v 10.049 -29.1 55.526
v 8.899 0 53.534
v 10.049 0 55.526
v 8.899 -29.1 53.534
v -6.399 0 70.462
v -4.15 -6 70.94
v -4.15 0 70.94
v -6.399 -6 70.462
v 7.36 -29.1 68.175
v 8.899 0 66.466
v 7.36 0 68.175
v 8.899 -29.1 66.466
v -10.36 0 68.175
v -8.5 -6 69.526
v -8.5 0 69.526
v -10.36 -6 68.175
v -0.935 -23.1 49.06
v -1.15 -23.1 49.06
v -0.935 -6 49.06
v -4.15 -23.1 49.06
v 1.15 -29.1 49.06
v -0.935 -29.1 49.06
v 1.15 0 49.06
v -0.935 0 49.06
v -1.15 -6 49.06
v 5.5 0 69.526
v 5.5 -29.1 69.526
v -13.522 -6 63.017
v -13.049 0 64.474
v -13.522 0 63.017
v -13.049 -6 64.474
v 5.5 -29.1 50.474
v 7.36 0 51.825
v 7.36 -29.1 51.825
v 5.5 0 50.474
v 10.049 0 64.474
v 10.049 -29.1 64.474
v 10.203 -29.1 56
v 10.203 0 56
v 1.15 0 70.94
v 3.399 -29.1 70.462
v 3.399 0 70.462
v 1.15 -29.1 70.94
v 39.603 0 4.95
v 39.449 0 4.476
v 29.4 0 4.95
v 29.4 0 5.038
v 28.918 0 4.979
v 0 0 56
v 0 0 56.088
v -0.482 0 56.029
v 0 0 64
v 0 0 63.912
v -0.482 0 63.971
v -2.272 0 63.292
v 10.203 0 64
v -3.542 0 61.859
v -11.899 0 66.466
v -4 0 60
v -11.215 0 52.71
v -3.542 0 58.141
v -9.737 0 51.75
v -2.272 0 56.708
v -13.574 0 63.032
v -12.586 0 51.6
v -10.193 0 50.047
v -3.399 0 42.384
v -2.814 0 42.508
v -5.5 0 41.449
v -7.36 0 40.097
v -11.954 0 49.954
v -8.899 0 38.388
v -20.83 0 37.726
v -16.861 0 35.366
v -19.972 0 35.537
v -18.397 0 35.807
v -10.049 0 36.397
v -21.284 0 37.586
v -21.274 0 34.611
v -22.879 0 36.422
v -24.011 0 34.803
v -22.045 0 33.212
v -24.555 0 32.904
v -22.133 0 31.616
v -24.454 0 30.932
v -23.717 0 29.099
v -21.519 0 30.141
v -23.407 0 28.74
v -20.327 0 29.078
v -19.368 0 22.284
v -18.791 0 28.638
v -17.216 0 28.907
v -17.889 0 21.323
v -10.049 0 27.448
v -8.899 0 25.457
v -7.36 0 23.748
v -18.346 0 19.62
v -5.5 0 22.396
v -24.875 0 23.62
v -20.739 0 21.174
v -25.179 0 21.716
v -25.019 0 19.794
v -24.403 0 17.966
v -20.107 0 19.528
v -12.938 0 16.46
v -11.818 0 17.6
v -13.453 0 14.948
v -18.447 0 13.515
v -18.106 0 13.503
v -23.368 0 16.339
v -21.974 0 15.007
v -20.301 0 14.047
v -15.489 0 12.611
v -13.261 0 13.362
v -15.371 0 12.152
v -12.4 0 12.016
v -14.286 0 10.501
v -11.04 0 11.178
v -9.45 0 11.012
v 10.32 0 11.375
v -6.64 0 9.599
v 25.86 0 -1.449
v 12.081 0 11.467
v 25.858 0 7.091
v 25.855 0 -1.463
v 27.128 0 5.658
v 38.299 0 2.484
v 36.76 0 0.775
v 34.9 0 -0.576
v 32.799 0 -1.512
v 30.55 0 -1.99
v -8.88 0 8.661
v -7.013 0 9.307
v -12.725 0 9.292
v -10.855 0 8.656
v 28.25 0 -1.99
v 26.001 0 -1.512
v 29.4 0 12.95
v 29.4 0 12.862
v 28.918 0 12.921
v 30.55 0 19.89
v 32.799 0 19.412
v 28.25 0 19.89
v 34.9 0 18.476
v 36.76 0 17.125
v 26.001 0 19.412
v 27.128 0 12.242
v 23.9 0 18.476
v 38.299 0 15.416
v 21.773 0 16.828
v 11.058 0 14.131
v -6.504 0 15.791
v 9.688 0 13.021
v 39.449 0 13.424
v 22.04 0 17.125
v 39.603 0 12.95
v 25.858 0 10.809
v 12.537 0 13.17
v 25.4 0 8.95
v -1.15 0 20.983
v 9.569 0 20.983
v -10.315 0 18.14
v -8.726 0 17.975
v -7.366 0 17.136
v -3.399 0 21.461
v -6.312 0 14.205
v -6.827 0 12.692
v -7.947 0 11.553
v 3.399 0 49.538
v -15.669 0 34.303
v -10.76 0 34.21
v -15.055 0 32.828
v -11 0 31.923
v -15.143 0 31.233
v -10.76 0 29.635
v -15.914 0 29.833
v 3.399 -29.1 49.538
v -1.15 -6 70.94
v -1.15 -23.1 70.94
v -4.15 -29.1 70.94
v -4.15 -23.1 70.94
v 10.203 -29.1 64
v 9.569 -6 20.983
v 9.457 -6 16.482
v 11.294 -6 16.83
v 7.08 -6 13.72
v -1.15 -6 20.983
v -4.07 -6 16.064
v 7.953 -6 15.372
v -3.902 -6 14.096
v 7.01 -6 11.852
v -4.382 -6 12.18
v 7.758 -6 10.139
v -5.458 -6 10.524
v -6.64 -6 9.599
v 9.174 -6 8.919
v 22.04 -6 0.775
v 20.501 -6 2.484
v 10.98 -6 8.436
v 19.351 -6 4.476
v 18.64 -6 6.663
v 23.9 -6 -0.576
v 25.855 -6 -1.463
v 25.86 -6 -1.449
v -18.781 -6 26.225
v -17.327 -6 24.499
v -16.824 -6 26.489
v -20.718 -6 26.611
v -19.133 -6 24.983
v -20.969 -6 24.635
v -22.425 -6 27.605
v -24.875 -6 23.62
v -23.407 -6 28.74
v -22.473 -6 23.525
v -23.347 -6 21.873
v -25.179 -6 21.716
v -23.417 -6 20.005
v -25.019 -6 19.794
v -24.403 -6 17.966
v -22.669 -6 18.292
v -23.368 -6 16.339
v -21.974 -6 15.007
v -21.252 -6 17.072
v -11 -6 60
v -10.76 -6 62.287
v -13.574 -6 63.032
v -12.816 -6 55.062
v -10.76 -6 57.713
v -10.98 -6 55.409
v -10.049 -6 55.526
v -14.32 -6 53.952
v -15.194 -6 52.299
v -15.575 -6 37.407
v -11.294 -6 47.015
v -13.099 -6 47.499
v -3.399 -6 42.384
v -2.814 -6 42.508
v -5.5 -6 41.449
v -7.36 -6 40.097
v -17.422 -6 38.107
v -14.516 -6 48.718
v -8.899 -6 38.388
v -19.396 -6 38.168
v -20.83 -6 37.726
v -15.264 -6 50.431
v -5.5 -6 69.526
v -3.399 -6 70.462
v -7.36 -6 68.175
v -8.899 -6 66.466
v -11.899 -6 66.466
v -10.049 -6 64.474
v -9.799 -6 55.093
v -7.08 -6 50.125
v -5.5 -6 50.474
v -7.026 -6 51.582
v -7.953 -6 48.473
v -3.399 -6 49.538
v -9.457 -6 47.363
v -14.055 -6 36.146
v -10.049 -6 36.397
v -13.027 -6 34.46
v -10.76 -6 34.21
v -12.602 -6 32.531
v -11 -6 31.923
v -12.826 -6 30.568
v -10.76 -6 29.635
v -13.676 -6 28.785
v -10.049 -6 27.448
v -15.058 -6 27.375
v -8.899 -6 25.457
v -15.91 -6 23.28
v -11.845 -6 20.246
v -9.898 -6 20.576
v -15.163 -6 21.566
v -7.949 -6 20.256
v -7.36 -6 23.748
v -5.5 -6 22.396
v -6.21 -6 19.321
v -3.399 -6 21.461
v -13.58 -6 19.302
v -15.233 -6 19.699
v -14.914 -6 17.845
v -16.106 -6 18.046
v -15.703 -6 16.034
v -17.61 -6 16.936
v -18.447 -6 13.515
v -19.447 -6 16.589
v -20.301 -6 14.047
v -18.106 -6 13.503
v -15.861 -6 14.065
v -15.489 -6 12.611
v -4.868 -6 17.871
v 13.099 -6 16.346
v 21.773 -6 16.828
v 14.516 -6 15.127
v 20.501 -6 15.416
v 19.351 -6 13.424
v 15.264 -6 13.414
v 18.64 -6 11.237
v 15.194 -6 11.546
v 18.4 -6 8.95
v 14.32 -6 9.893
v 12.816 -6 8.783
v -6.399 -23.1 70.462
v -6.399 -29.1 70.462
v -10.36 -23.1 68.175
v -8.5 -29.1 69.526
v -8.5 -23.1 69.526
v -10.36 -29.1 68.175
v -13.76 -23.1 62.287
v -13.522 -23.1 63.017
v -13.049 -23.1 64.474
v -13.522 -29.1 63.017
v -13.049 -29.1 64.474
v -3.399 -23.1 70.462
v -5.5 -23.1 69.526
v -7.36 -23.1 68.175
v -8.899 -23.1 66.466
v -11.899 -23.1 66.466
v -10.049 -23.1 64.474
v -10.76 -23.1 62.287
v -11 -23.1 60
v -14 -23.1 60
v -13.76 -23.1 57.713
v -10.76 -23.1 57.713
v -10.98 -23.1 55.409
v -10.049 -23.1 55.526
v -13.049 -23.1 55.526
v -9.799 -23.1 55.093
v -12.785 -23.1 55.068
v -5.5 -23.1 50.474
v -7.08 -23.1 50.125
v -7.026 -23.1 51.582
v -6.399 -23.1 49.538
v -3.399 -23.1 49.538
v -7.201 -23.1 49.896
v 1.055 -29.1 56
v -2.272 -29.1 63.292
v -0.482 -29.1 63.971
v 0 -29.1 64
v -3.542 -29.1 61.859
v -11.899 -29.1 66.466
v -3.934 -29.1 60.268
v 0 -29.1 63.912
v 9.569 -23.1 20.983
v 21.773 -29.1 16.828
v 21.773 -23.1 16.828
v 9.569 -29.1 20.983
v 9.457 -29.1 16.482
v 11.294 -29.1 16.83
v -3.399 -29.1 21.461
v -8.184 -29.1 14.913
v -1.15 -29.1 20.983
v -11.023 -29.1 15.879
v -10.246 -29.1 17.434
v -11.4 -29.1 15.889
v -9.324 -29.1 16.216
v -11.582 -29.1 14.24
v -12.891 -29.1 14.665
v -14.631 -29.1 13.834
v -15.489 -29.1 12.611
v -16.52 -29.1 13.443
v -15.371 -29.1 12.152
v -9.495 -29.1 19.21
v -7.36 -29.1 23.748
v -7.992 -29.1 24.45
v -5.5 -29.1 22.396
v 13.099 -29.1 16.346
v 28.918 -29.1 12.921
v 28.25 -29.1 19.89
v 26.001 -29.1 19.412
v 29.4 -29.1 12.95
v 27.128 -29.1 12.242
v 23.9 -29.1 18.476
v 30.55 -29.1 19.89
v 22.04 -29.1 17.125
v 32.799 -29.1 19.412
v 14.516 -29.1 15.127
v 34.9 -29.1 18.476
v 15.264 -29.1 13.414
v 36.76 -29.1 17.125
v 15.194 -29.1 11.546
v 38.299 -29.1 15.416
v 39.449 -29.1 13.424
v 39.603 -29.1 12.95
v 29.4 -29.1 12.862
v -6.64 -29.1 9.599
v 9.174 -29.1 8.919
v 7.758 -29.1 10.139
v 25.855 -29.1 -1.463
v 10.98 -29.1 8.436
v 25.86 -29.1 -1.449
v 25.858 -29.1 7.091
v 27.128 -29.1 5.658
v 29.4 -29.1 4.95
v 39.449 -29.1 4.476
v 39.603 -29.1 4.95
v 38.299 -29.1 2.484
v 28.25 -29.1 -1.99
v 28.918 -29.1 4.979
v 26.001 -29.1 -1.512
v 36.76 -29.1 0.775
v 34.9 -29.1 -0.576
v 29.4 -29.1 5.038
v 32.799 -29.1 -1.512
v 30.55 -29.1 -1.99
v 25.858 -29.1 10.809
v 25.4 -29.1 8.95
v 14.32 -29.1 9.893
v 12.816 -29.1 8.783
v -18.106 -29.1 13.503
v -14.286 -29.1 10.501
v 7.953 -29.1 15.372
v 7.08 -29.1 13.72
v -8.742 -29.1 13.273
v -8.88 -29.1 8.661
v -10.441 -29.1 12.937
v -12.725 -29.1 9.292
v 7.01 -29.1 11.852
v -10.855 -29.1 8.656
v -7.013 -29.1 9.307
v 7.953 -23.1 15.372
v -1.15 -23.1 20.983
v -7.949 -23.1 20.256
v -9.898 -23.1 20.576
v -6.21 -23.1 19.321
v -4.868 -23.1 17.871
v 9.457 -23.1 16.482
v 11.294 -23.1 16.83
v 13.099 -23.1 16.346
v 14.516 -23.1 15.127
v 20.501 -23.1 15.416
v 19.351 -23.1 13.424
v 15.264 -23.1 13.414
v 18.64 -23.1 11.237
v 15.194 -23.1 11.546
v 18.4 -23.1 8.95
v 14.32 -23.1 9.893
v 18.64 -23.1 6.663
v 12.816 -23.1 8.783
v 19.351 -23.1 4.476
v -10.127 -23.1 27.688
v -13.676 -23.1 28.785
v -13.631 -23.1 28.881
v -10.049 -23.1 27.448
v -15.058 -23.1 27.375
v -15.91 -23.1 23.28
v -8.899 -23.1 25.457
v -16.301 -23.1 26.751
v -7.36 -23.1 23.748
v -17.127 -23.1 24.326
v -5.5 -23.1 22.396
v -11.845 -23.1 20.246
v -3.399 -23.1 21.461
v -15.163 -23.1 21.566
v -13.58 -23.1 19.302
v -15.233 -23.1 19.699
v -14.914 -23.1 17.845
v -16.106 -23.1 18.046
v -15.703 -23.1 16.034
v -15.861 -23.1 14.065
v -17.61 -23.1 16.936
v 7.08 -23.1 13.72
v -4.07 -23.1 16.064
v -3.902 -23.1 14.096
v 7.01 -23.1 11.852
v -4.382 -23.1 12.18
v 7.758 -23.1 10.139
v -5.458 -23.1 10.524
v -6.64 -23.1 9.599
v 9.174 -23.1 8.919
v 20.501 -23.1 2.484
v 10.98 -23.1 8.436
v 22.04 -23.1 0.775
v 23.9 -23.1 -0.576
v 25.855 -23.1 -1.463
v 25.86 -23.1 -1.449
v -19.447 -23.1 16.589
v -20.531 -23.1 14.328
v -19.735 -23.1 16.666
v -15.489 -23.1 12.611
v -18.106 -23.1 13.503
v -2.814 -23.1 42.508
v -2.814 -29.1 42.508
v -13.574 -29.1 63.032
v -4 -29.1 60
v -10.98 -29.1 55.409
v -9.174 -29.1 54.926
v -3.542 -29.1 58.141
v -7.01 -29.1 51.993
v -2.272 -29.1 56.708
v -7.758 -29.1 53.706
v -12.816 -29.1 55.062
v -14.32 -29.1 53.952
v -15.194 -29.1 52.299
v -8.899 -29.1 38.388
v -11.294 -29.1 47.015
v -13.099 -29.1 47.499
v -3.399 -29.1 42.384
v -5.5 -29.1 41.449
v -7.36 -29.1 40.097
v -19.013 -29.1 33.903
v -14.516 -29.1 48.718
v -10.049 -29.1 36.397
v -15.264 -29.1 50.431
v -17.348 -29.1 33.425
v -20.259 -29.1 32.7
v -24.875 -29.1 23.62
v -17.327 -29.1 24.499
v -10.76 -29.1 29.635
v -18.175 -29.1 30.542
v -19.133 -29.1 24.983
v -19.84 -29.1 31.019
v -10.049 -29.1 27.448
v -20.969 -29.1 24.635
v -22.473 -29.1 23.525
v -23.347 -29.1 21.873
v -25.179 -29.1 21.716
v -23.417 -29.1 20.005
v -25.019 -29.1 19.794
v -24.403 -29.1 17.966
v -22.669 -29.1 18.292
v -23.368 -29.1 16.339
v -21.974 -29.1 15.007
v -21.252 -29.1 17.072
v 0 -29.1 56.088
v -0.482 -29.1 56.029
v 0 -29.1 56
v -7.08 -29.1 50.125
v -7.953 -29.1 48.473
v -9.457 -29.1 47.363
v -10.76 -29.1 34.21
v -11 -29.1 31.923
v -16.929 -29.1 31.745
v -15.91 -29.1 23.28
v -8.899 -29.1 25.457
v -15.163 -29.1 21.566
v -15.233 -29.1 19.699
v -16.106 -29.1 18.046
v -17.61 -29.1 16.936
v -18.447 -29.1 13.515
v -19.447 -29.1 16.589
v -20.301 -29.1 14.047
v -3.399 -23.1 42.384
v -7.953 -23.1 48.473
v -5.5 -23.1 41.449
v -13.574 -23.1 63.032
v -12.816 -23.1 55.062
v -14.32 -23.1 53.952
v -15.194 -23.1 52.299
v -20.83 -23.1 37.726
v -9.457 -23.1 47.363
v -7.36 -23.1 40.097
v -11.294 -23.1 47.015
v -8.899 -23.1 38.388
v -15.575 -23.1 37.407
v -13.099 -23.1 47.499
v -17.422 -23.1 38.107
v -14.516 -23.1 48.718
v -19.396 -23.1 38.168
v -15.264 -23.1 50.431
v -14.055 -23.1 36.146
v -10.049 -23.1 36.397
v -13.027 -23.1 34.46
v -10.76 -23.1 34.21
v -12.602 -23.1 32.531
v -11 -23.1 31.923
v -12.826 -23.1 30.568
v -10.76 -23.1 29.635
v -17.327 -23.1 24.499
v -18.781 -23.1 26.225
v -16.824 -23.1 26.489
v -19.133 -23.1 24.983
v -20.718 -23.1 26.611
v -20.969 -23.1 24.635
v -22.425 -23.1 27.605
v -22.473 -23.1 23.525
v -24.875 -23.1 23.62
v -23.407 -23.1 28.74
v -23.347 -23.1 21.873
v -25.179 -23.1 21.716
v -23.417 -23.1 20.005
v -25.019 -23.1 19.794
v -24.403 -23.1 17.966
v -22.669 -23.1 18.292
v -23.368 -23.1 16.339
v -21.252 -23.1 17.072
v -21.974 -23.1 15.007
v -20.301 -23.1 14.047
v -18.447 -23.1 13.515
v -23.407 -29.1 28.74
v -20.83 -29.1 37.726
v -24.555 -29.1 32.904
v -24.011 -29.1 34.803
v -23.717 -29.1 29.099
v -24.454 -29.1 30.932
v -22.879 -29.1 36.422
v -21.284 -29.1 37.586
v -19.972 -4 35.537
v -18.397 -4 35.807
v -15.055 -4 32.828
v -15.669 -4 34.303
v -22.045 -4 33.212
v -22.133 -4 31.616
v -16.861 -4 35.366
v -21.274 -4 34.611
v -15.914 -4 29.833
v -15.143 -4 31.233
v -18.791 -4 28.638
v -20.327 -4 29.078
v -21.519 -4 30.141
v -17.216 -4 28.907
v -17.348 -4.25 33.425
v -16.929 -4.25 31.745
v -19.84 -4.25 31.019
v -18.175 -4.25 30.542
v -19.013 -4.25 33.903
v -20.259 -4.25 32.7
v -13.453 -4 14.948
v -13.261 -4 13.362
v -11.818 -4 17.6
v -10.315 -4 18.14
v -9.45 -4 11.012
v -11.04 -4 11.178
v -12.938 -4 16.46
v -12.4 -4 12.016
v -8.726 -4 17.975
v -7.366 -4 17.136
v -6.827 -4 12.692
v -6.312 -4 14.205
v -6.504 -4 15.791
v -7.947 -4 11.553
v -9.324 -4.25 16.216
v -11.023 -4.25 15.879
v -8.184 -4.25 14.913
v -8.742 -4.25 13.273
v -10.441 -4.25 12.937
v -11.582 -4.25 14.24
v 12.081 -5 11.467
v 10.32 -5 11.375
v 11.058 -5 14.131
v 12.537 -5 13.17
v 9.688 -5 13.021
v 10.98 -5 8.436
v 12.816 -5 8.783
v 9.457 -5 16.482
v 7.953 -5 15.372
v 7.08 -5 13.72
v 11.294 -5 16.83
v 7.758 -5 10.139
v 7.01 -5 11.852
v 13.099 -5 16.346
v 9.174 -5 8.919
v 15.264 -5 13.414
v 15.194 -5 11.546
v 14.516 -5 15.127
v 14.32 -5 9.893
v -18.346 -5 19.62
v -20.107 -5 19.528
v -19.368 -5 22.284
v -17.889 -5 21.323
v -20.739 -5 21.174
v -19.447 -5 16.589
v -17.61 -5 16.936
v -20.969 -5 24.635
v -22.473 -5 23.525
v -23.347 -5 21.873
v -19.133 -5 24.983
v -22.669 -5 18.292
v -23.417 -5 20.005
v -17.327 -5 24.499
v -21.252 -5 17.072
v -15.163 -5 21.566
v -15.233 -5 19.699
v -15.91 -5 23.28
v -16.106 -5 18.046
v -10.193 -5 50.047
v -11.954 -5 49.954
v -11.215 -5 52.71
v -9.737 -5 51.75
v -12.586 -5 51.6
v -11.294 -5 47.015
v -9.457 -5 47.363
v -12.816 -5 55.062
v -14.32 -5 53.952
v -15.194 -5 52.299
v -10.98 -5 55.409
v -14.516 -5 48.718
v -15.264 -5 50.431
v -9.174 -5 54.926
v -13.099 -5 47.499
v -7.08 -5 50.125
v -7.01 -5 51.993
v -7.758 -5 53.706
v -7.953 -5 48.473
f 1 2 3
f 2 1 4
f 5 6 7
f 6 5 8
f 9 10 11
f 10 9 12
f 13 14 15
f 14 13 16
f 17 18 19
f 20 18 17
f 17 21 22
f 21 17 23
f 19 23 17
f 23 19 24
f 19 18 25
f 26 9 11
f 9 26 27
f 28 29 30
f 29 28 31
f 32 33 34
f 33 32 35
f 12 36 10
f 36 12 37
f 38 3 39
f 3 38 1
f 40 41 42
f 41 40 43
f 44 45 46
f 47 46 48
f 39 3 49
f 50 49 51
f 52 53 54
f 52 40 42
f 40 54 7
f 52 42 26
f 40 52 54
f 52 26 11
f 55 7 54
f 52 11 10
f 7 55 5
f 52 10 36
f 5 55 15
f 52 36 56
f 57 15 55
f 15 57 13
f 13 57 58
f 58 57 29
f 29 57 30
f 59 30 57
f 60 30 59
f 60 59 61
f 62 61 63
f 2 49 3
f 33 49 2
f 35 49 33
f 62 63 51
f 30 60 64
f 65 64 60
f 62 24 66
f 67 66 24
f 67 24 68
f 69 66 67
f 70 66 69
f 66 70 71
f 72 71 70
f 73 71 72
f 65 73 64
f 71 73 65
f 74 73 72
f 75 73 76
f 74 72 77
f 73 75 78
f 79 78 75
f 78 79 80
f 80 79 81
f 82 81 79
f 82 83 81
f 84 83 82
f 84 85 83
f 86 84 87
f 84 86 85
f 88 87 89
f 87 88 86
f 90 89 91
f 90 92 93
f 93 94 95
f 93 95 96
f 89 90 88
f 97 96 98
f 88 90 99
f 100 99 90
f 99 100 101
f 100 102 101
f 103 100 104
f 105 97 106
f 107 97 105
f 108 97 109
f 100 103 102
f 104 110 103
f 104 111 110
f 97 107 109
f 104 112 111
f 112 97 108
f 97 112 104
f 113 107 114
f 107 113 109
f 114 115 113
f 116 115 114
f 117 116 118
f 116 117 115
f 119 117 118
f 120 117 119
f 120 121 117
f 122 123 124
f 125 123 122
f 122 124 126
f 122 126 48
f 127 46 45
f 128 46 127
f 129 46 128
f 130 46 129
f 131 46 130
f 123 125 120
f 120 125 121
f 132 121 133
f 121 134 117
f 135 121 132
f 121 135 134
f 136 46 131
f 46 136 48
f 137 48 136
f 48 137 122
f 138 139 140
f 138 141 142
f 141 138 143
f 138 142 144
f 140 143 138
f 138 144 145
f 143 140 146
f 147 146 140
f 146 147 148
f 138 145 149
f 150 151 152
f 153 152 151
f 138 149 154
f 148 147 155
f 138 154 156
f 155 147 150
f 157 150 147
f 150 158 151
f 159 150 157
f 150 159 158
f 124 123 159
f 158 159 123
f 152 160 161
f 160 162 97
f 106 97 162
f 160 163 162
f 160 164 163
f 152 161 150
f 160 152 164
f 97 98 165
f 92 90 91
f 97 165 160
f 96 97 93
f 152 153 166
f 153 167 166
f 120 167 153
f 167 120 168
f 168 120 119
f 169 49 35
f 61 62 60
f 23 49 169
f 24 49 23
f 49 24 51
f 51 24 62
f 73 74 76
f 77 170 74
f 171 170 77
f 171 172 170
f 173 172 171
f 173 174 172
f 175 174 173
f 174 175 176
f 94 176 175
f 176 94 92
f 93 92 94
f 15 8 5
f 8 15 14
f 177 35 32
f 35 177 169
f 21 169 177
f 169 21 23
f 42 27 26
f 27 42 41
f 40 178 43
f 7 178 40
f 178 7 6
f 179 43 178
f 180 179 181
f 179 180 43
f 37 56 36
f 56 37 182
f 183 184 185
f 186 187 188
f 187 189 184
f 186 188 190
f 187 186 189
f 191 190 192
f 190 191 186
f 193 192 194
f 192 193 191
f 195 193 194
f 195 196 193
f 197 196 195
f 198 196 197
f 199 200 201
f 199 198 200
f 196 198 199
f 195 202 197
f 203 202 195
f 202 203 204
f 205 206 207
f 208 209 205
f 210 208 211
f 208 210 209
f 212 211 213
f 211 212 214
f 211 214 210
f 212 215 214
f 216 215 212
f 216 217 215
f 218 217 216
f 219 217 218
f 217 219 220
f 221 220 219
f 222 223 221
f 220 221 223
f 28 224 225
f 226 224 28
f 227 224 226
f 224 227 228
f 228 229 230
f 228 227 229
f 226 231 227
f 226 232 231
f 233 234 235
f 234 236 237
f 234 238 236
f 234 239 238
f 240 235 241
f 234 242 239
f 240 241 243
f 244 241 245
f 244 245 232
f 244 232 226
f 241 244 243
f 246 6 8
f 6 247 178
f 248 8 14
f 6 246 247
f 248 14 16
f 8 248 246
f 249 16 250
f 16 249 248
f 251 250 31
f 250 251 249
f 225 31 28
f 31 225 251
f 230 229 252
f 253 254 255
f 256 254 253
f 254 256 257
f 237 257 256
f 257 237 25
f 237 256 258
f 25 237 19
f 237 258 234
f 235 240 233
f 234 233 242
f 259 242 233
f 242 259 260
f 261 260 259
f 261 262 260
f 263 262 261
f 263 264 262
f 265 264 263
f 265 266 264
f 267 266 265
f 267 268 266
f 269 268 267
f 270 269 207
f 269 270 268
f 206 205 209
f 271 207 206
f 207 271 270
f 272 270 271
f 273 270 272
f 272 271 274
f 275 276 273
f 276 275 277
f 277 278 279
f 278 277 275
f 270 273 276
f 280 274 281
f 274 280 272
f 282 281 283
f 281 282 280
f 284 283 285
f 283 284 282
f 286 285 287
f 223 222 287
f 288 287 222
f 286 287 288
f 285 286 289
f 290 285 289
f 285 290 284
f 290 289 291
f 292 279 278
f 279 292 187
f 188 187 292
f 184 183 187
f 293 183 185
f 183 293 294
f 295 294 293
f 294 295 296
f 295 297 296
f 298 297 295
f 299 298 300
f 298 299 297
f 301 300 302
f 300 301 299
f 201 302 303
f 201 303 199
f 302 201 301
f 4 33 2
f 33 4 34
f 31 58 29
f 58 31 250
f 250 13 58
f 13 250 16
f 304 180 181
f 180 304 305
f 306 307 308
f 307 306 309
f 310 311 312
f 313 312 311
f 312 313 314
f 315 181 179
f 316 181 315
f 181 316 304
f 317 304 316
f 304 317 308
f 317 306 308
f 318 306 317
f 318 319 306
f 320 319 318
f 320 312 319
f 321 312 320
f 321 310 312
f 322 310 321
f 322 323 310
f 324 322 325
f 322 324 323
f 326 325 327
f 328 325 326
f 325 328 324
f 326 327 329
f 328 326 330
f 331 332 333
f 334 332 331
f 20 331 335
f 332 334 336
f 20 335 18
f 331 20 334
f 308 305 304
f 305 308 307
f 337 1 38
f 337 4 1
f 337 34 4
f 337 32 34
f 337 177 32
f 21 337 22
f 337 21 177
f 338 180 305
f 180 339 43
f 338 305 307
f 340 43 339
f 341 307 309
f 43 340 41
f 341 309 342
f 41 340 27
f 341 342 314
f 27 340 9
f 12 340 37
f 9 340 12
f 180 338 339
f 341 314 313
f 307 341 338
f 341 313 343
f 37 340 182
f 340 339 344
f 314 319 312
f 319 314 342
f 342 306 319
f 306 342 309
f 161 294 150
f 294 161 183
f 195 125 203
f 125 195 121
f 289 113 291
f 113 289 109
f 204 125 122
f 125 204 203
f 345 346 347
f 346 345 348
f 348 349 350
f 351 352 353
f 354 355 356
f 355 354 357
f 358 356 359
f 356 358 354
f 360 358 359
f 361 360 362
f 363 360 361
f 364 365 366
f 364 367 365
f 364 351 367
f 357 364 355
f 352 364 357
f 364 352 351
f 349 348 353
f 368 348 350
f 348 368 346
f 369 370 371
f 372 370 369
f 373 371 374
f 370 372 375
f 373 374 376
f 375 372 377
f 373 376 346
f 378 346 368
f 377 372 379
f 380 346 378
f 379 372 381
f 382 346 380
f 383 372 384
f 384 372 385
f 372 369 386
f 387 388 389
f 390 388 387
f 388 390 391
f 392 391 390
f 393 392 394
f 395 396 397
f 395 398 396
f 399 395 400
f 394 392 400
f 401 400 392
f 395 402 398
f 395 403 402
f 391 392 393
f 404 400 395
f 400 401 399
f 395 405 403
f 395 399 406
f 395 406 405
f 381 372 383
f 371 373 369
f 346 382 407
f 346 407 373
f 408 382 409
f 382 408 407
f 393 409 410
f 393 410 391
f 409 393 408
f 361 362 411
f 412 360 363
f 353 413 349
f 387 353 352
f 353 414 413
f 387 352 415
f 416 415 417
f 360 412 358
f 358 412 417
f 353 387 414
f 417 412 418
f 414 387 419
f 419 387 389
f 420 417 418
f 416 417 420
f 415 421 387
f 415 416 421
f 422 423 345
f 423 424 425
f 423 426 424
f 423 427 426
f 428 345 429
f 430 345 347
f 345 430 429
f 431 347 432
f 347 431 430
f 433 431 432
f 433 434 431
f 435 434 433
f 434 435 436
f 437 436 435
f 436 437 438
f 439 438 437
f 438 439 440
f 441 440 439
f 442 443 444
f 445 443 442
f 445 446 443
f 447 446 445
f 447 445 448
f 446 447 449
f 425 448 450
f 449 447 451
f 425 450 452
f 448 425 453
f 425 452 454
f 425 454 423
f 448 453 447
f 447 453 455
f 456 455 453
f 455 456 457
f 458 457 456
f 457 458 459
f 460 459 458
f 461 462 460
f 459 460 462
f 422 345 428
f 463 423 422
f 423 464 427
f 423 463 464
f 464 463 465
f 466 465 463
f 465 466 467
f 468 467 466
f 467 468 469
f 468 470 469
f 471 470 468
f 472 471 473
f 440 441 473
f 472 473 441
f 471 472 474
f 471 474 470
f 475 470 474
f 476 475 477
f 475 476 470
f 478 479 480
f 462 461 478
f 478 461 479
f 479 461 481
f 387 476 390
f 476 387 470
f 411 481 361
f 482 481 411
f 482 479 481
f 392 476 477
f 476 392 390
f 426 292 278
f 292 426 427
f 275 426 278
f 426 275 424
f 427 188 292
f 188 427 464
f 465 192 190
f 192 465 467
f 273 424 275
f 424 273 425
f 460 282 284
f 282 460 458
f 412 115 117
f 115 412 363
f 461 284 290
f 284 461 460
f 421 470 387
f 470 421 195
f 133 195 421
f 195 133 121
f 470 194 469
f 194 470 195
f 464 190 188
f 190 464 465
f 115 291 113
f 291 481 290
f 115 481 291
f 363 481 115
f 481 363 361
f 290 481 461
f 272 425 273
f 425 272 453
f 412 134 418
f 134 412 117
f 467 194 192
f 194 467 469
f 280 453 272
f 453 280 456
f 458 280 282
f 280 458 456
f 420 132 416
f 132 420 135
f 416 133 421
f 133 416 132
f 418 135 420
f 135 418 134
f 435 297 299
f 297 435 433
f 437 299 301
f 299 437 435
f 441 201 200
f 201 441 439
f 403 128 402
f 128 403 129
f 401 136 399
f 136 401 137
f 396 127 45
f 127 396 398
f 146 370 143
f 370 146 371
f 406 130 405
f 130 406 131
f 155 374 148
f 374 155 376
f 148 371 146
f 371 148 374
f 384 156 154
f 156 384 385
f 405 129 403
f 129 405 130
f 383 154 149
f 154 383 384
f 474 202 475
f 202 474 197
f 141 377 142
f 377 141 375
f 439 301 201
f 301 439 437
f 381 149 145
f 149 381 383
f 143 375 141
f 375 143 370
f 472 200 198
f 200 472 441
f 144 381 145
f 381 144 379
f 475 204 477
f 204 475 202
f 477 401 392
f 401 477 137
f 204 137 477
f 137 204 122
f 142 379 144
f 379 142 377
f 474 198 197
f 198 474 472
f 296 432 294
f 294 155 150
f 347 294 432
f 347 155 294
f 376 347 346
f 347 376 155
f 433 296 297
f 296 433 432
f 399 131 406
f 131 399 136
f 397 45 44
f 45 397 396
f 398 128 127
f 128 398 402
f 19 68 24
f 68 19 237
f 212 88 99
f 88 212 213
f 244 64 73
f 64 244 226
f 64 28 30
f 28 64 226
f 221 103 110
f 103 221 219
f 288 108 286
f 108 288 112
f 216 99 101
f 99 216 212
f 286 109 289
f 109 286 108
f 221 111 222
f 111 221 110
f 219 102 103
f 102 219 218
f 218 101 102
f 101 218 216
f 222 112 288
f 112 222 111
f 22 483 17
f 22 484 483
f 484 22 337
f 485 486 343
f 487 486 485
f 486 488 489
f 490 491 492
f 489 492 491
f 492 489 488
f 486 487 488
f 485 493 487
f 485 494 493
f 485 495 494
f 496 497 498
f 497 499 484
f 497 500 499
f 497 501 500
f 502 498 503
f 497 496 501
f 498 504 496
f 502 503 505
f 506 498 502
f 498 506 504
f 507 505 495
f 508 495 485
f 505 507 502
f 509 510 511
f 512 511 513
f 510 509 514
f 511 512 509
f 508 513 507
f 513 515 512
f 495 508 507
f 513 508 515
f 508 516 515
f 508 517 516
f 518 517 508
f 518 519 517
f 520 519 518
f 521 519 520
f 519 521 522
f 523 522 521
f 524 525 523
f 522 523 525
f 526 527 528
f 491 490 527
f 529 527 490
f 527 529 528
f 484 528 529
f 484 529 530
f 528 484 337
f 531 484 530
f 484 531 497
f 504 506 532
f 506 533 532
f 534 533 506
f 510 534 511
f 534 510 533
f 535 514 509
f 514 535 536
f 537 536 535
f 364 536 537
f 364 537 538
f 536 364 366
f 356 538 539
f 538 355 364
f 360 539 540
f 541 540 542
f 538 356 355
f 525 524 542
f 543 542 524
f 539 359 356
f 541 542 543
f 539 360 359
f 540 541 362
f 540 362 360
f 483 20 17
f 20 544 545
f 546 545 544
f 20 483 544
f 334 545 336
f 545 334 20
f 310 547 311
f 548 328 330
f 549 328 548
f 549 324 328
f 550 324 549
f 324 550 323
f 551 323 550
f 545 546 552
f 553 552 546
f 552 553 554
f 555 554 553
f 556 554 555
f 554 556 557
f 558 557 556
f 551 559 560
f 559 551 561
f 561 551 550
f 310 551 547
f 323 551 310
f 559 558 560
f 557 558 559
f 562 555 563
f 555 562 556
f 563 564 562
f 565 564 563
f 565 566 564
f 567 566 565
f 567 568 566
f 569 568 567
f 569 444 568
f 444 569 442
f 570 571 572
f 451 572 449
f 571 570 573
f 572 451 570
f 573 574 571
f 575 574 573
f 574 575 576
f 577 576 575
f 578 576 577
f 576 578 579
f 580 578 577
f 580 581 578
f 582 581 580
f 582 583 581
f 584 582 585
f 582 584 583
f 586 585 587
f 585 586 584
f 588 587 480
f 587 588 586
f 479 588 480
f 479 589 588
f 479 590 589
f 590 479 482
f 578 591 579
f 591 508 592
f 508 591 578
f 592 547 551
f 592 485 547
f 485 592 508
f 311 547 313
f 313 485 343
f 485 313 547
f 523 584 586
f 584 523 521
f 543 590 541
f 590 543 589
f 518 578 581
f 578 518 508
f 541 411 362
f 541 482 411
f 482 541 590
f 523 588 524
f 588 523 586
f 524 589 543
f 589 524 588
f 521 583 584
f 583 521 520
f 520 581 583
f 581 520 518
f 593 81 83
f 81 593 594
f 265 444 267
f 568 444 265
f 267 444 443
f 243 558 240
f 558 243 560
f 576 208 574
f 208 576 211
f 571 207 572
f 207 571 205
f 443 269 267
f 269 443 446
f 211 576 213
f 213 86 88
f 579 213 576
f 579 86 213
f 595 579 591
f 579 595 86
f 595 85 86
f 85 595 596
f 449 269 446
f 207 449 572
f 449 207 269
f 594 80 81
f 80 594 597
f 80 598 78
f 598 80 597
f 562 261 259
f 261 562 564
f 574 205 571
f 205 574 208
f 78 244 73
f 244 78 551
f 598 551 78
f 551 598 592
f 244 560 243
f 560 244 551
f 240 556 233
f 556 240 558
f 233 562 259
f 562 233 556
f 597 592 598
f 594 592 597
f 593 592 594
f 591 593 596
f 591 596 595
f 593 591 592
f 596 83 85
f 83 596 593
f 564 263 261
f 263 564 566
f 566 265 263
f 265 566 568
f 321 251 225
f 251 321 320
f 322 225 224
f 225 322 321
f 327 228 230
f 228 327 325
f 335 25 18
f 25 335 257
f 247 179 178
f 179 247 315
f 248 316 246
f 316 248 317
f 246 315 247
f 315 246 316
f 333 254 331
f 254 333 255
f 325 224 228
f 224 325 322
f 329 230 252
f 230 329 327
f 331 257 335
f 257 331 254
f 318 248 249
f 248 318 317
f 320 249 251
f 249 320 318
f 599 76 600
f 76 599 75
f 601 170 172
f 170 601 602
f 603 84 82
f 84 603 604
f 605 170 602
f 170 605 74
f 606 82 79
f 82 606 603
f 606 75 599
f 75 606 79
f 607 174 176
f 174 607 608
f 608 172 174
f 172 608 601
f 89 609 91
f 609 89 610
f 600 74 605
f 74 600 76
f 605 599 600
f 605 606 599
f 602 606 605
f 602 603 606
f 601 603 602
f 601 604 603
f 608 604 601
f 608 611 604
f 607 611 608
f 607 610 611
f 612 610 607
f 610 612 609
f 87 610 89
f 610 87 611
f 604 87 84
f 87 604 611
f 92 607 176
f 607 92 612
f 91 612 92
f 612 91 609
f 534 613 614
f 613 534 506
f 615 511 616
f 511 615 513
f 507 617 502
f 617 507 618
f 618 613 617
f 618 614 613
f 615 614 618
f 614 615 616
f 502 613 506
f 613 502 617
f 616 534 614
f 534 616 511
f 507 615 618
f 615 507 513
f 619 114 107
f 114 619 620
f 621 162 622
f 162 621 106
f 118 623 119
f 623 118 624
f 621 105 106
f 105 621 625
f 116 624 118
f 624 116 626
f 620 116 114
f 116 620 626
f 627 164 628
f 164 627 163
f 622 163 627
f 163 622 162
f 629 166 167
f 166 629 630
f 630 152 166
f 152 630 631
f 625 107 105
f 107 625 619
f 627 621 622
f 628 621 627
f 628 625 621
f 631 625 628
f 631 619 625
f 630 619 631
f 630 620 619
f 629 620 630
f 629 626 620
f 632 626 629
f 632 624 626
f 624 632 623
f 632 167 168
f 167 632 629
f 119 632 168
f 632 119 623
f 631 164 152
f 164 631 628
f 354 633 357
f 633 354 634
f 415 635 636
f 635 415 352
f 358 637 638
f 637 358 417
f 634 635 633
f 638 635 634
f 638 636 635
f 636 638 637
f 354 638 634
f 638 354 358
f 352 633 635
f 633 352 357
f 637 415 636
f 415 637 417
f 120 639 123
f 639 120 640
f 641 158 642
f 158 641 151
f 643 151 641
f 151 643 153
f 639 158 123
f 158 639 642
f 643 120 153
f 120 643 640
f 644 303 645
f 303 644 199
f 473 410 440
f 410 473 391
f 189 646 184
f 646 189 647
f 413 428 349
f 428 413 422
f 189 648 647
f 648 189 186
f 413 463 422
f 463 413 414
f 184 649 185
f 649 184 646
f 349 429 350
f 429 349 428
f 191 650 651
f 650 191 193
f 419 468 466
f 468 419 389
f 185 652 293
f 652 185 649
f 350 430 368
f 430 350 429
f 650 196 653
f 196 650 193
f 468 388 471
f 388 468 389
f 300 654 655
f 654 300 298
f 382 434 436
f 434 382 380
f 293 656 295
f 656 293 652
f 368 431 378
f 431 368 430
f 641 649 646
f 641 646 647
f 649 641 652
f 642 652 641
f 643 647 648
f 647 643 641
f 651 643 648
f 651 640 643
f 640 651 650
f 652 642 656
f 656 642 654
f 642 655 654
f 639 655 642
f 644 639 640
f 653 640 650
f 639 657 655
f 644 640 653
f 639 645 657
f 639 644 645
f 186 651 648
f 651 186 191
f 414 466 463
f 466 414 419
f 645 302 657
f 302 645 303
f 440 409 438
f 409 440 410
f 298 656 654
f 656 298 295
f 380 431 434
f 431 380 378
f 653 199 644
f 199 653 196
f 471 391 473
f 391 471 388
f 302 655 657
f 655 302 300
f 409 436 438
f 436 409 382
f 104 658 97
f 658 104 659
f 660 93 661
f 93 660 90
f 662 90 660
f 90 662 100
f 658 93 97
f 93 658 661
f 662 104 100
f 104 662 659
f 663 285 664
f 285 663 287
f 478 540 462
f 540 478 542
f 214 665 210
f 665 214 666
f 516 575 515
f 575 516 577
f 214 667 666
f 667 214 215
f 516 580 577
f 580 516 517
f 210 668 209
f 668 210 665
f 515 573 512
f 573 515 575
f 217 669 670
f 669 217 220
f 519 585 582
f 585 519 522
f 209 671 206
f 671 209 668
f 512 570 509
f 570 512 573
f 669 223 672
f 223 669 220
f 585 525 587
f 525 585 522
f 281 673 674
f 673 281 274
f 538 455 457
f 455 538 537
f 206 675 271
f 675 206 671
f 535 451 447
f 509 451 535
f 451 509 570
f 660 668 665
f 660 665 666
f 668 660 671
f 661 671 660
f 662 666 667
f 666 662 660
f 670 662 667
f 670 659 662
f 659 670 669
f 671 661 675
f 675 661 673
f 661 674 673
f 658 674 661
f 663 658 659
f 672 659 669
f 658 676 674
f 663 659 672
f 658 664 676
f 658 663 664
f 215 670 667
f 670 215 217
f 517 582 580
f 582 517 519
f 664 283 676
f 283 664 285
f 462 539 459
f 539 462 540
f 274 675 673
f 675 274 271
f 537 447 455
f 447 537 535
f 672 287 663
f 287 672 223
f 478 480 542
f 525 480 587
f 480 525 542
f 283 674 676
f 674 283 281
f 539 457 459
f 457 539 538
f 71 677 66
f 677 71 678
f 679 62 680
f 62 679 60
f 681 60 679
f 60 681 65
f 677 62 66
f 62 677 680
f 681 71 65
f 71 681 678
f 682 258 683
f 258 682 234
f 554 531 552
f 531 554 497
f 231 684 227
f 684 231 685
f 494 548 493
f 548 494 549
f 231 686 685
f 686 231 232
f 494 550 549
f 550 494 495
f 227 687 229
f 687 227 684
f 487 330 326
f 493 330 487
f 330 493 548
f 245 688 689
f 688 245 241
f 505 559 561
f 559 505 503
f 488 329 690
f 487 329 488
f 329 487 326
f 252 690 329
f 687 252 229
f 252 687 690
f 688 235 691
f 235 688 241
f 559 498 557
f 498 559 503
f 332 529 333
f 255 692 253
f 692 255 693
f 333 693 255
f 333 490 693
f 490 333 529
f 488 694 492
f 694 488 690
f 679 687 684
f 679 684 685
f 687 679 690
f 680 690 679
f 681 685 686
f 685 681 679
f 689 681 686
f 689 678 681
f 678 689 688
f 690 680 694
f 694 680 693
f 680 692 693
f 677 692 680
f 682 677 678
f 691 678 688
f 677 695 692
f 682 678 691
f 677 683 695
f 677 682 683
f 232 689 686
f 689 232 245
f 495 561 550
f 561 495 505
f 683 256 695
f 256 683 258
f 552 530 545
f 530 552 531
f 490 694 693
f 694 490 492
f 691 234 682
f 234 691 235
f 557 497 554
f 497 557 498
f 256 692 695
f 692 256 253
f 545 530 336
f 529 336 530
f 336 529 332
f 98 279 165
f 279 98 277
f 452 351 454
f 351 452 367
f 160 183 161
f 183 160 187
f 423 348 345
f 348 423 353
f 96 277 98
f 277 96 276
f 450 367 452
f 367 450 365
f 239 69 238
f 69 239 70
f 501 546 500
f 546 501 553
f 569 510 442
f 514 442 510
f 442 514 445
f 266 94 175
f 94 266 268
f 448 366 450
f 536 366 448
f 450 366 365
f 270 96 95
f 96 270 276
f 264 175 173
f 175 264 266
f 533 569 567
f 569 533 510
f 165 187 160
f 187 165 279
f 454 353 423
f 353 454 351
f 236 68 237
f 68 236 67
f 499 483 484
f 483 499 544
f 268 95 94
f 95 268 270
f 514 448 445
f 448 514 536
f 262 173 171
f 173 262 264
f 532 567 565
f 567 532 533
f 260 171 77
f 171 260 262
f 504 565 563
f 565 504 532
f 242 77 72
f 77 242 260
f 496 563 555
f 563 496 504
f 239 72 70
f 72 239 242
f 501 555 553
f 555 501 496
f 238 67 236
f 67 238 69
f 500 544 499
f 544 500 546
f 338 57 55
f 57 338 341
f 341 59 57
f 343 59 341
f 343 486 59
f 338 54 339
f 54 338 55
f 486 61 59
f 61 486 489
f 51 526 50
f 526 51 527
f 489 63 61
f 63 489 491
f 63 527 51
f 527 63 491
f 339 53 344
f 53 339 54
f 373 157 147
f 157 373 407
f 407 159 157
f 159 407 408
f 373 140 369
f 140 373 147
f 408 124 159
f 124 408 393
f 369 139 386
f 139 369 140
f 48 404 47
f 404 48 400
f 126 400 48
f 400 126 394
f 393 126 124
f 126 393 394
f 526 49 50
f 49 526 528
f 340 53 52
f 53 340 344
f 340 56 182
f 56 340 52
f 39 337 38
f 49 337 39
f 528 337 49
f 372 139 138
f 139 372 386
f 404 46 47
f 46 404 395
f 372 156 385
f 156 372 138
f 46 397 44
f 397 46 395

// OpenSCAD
// Y bearing Idler bracket(s) with belt tensioner
// Michel Pollet <buserror@gmail.com>
// 
// inspired by http://www.thingiverse.com/thing:12299
// inspired by http://www.thingiverse.com/thing:12148

include <MCAD/motors.scad>

E = 0.01;
bar_width = 20;
bar_thickness = 6;
bushing_diameter = 22;
m8_diameter = 8;

double_bearings_and_washer = 17.1;

total_thickness = (bar_thickness + (double_bearings_and_washer/2)) * 2;

echo("total_thickness", total_thickness);

// don't change these
bar_x_offset = 3.4 + 26;
bar_y_offset = 30.05 + 21;

top_bar_to_bearing_distance = (bar_y_offset / 2) * 1.1;

bottom_angle = atan((bar_y_offset-top_bar_to_bearing_distance) / bar_x_offset);
bottom_bar_length = bar_x_offset / cos(bottom_angle);
echo("bottom angle", bottom_angle, bottom_bar_length);

demo = 1;
spikey_first_layer_support = 1;
use_brass_insert_for_tension = 0;
use_m3_nut_for_tension = 1;

motor_inter_screw = 31.5;

brass_insert_diameter = 4;
m3_diameter = 3;
m3_nut_diameter = 5.7;
m3_nut_height = 2.5;
m3_bolt_head_thickness = 4; // with washer
m3_washer_diameter = 7;

smallbar_width = bar_width - 4;
angle1 = 180 + 16;
angle2 = 108.8;
length_top_bar = 41;
length_bot_bar = 49;
support_column_diameter = 6*2;
bridged_holes_layer = 0.25;

top_extra_thickness = 3;

mirror([1,0,0]) {
	if (demo == 1) {
		translate([0,0,60])
		rotate([90,0,0])
			ybract();
	} else {
		translate([0,0,total_thickness])
		rotate([0,180,0])
		difference() {
			union() {
				ybract();
				if (spikey_first_layer_support == 1) {
					translate([-8,0,total_thickness-bridged_holes_layer])
						cylinder(r=8,h=bridged_holes_layer);
					translate([-bar_x_offset, -bar_y_offset, 0])
					translate([-8,0,total_thickness-bridged_holes_layer])
						cylinder(r=8,h=bridged_holes_layer);
				}
			}
			translate([-60,-80, -1])
				cube([100, 100, 1+(total_thickness / 2)]);
		}
		translate([10,35,0])
		rotate([0,0,30])
		difference() {
			union() {
				ybract();
				if (spikey_first_layer_support == 1) {
					translate([-8,0,0])
						cylinder(r=8,h=bridged_holes_layer);
					translate([-bar_x_offset, -bar_y_offset, 0])
					translate([-8,0,0])
						cylinder(r=8,h=bridged_holes_layer);
				}
			}
			translate([-60,-80, total_thickness / 2])
				cube([100, 100, 1+(total_thickness / 2)]);
		}
	}
}
	

module ybract() difference() {
	union() {
	  // top circle
		cylinder(r=bushing_diameter/2, h=total_thickness);
	//	% cylinder(r=16/2, h = total_thickness);
		for (z = [0:1])
			translate([0, 0, z * (total_thickness - bar_thickness)])
	  		hull() {
				cylinder(r=bushing_diameter/2, h=bar_thickness);
				translate([top_extra_thickness, 0, 0])
					cylinder(r=bushing_diameter/2, h=bar_thickness);
			}
	
		// bottom circle
		translate([-bar_x_offset, -bar_y_offset, 0]) {
			cylinder(r=bushing_diameter/2, h=total_thickness);

			rotate([0, 0, angle2]) {
				translate([-bushing_diameter/2, -length_bot_bar, 0]) {				
					for (z = [0:1])
						translate([0, 0, z * (total_thickness - bar_thickness)]) 	
							cube([bar_width-4, length_bot_bar, bar_thickness]);					
				}
				// screw support one
				translate([-bushing_diameter/3,-length_bot_bar + 10,0])
					cylinder(r = support_column_diameter/2, h = total_thickness);
			}
		}
	
		// middle circle
	//	translate([0,  - top_bar_to_bearing_distance, 0])
	//		cylinder(r=bushing_diameter/2, h=bar_thickness);

		translate([top_extra_thickness,0,0])
		rotate([0,0,angle1]) {
			for (z = [0:1])
				translate([0, 0, z * (total_thickness - bar_thickness)]) {
			
					translate([-bushing_diameter/2, 0, 0])
						cube([smallbar_width, length_top_bar, bar_thickness]);
					translate([-(bushing_diameter/2)+(smallbar_width/2), length_top_bar, 0])
						cylinder(r=smallbar_width/2, h=bar_thickness);
				}
			// screw support two
			translate([-bushing_diameter/3,length_top_bar-10,0])
				cylinder(r = support_column_diameter /2, h = total_thickness);

		}
	}

	translate([top_extra_thickness,0,0])
	rotate([0,0,angle1]) {
		// screw support two
		translate([-bushing_diameter/3,length_top_bar-10, -1]) {
			nut(r = m3_nut_diameter, h = 1 + m3_nut_height);
			polyhole(d = m3_washer_diameter, h = 1 + m3_bolt_head_thickness);
			translate([0,0,1 + m3_bolt_head_thickness + bridged_holes_layer])
				polyhole(d = m3_diameter, h = total_thickness + 2);
		}
	}
	translate([-bar_x_offset, -bar_y_offset, 0]) {
		rotate([0, 0, angle2]) {
			// screw support one
			translate([-bushing_diameter/3,-length_bot_bar+10, -1]) {
				polyhole(d = m3_washer_diameter, h = 1 + m3_bolt_head_thickness);
				translate([0,0,1 + m3_bolt_head_thickness + bridged_holes_layer])
					polyhole(d = m3_diameter, h = total_thickness + 2);
			}
		}
	}
	translate([0,0,-1])
		cylinder(r=m8_diameter/2, h=total_thickness + 2);
	translate([-bar_x_offset,-bar_y_offset,-1])
		cylinder(r=m8_diameter/2, h=total_thickness + 2);

	translate([0, 0 - top_bar_to_bearing_distance, -1]) {
//		cylinder(r=m8_diameter/2, h=total_thickness + (2*E));
		 hull() {
			cylinder(r = (motor_pulley_hole_diameter/2)*1.1, h = total_thickness+2);
			translate([-50,0,0])
				cylinder(r = (motor_pulley_hole_diameter/2)*1.1, h = total_thickness+2);
		}
		rotate([0,0,15])
			motor();
	}
	
	// make slots
	translate([-bushing_diameter, - m8_diameter/2, -1])
		cube([bushing_diameter, m8_diameter, total_thickness + 2]);
	
	translate([-bar_x_offset - bushing_diameter, -bar_y_offset - m8_diameter/2, -1])
		cube([bushing_diameter, m8_diameter, total_thickness + 2]);

}

motor_pulley_hole_diameter = 20;
module motor() {
//	stepper_motor_mount(17);
	translate([0,0,-E]) {
		if (demo == 1) %union() {
			cylinder(r = motor_pulley_hole_diameter/2, h = total_thickness - 5);		
			translate([-20,-20,-20])
				cube([40,40,20]);
		}
		hull() {
			cylinder(r = motor_pulley_hole_diameter/2, h = total_thickness + 10);
			translate([-10,10,0])
				cylinder(r = motor_pulley_hole_diameter /2, h = total_thickness + 10);
		}
		for (y=[-1:1])
			for (x=[-1:1]) if (x && y)
				translate([x * (motor_inter_screw/2), y * (motor_inter_screw/2), 0]) {
					cylinder(r = m3_diameter / 2, h = bar_thickness+1);
					
					// holes to put the alen key in
					translate([0,0,bar_thickness+E]) {
						cylinder(r = (m3_washer_diameter / 2) * 1.2, h = total_thickness);
					}
				}
	}
}

module nut(d,h,horizontal=true){
cornerdiameter =  (d / 2) / cos (180 / 6);
cylinder(h = h, r = cornerdiameter, $fn = 6);
if(horizontal){
for(i = [1:6]){
	rotate([0,0,60*i]) translate([-cornerdiameter-0.2,0,0]) rotate([0,0,-45]) cube(size = [2,2,h]);
}}
}

// Based on nophead research
module polyhole(d,h) {
    n = max(round(2 * d),3);
    rotate([0,0,180])
        cylinder(h = h, r = (d / 2) / cos (180 / n), $fn = n);
}

module roundcorner(diameter){
	difference(){
		cube(size = [diameter,diameter,99], center = false);
		translate(v = [diameter, diameter, 0]) cylinder(h = 100, r=diameter, center=true);
	}
}
